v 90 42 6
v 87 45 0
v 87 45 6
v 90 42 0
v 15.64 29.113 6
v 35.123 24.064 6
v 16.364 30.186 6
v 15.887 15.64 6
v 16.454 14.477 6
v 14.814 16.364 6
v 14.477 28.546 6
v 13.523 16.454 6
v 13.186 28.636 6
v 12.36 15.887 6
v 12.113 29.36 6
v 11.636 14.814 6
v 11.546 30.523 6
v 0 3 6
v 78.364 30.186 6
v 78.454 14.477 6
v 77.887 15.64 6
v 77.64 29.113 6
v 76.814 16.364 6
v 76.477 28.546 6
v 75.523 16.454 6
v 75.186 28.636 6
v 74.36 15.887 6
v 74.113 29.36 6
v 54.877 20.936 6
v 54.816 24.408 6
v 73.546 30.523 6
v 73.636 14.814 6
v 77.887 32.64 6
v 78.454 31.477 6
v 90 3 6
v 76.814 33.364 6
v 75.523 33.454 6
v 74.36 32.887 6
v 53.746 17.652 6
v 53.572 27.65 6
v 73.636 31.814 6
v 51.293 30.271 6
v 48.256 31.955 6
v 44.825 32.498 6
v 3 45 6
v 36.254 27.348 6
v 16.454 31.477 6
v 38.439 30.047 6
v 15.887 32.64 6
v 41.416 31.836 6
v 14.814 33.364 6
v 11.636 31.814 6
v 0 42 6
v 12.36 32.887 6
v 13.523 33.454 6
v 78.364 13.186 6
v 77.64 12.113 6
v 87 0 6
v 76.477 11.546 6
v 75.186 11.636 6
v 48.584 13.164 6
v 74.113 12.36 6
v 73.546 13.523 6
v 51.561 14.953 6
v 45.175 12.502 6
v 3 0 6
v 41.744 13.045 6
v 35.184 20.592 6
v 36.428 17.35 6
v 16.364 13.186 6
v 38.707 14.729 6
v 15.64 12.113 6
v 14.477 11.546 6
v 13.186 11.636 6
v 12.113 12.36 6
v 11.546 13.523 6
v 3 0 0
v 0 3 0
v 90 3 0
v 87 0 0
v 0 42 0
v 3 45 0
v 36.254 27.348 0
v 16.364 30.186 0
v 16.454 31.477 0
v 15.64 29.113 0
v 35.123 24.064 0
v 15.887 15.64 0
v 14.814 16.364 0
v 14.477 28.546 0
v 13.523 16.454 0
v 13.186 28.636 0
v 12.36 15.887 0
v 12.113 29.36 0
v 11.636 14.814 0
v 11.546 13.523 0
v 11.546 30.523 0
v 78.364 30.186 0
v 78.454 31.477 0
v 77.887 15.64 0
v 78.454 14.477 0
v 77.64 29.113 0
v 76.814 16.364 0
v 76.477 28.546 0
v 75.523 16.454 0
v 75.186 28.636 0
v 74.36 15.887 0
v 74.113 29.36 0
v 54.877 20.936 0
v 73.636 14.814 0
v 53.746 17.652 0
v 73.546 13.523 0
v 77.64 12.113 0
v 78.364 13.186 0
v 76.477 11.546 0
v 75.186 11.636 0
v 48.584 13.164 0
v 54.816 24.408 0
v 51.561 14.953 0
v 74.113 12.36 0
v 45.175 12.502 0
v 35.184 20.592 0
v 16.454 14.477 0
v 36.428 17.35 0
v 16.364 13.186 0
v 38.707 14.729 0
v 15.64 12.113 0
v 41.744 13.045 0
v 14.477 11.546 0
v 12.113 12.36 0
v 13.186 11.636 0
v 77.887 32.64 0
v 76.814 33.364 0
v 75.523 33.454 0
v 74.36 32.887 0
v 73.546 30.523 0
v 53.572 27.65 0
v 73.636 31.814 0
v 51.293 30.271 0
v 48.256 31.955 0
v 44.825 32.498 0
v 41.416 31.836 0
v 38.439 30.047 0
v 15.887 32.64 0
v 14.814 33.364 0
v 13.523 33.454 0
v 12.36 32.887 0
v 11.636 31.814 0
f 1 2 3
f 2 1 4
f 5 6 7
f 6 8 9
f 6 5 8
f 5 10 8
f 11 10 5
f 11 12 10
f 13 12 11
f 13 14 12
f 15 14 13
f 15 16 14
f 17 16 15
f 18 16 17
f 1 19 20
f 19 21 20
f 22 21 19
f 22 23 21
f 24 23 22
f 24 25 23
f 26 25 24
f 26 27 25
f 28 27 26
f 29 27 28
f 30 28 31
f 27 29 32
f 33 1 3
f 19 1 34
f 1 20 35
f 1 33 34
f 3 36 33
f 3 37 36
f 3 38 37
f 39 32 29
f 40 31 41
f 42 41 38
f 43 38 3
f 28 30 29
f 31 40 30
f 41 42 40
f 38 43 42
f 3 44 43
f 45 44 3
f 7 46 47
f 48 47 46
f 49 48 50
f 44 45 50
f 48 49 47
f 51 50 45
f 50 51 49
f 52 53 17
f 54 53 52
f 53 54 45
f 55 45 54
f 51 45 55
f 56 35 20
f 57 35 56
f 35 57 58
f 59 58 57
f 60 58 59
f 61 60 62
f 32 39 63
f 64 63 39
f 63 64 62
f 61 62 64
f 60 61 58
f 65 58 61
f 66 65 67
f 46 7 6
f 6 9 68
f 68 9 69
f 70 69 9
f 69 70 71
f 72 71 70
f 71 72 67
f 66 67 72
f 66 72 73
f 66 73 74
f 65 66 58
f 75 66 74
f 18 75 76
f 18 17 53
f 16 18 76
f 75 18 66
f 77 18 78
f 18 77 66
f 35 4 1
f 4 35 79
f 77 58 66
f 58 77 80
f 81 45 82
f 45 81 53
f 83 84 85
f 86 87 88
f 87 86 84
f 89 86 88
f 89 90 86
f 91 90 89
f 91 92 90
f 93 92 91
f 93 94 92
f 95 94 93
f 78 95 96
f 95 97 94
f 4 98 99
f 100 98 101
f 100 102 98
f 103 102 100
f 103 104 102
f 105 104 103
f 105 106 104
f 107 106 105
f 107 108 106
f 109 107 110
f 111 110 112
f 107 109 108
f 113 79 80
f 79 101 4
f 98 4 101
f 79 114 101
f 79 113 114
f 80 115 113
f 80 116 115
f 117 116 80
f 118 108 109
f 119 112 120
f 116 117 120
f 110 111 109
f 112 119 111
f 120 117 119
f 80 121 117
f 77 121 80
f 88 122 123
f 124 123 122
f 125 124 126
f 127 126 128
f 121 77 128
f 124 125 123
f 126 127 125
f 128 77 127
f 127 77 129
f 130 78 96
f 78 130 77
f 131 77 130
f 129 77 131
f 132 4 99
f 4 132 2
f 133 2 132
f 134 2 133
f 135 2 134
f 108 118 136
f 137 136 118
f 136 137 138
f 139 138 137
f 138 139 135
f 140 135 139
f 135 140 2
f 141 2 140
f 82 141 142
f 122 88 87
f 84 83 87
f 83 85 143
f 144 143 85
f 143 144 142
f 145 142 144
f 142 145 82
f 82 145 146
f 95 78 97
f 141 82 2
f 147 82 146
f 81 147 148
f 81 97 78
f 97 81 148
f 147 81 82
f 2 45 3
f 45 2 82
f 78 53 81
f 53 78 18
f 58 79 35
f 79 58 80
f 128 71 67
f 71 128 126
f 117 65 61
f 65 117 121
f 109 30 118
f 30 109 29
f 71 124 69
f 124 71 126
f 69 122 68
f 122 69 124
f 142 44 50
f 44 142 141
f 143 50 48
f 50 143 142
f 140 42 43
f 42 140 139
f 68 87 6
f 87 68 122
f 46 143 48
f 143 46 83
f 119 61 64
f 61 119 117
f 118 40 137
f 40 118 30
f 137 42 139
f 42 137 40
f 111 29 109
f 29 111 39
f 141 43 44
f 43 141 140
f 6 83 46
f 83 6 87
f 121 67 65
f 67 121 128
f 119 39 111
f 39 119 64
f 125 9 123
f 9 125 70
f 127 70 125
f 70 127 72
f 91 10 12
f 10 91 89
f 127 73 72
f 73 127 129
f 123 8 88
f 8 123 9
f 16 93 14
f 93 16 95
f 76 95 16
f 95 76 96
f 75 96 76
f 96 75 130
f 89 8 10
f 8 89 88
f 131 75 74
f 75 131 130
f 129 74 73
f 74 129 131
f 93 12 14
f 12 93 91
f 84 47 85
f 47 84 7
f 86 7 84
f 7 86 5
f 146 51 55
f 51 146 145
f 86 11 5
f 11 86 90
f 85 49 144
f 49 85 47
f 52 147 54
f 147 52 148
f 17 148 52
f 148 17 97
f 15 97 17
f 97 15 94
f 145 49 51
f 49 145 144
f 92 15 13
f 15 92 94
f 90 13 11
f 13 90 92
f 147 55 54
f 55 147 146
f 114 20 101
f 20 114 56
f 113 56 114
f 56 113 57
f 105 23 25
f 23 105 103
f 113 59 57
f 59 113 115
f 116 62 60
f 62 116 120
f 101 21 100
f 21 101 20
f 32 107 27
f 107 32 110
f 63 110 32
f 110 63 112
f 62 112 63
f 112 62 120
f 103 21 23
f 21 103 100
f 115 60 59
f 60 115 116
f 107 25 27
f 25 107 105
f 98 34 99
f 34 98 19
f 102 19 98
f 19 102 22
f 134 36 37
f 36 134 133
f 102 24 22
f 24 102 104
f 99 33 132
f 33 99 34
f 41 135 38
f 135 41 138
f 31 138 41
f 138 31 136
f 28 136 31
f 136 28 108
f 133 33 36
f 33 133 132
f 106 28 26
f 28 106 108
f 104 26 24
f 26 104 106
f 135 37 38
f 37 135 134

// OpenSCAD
$fn = 32;

// ----------------------------------------------------------------------
// Spacer plate: rect 90 x 45
// ----------------------------------------------------------------------

// --- parameters (mm) ---
bore_r = 10;              // centre bore radius
bolt_r = 2.5;             // bolt hole radius
plate_t = 6;              // plate thickness, Z (extrusion height)
plate_l = 90;             // plate length, X
plate_w = 45;             // plate width, Y
inset = 14;               // corner hole inset

profile = [[3, 0], [87, 0], [90, 3], [90, 42], [87, 45], [3, 45], [0, 42], [0, 3]];  // primary outline, 8 points, counter clockwise
void_1 = [[54.816, 24.408], [53.572, 27.65], [51.293, 30.271], [48.256, 31.955], [44.825, 32.498], [41.416, 31.836], [38.439, 30.047], [36.254, 27.348], [35.123, 24.064], [35.184, 20.592], [36.428, 17.35], [38.707, 14.729], [41.744, 13.045], [45.175, 12.502], [48.584, 13.164], [51.561, 14.953], [53.746, 17.652], [54.877, 20.936]];  // centre bore, 18 points
void_2 = [[16.454, 14.477], [15.887, 15.64], [14.814, 16.364], [13.523, 16.454], [12.36, 15.887], [11.636, 14.814], [11.546, 13.523], [12.113, 12.36], [13.186, 11.636], [14.477, 11.546], [15.64, 12.113], [16.364, 13.186]];  // corner hole, 12 points
void_3 = [[16.454, 31.477], [15.887, 32.64], [14.814, 33.364], [13.523, 33.454], [12.36, 32.887], [11.636, 31.814], [11.546, 30.523], [12.113, 29.36], [13.186, 28.636], [14.477, 28.546], [15.64, 29.113], [16.364, 30.186]];  // corner hole, 12 points
void_4 = [[78.454, 14.477], [77.887, 15.64], [76.814, 16.364], [75.523, 16.454], [74.36, 15.887], [73.636, 14.814], [73.546, 13.523], [74.113, 12.36], [75.186, 11.636], [76.477, 11.546], [77.64, 12.113], [78.364, 13.186]];  // corner hole, 12 points
void_5 = [[78.454, 31.477], [77.887, 32.64], [76.814, 33.364], [75.523, 33.454], [74.36, 32.887], [73.636, 31.814], [73.546, 30.523], [74.113, 29.36], [75.186, 28.636], [76.477, 28.546], [77.64, 29.113], [78.364, 30.186]];  // corner hole, 12 points

// --- the one profile operation ---
difference() {
  linear_extrude(height = plate_t) polygon(points = profile);
  translate([0, 0, -1])
    linear_extrude(height = plate_t + 2) polygon(points = void_1);
  translate([0, 0, -1])
    linear_extrude(height = plate_t + 2) polygon(points = void_2);
  translate([0, 0, -1])
    linear_extrude(height = plate_t + 2) polygon(points = void_3);
  translate([0, 0, -1])
    linear_extrude(height = plate_t + 2) polygon(points = void_4);
  translate([0, 0, -1])
    linear_extrude(height = plate_t + 2) polygon(points = void_5);
}
